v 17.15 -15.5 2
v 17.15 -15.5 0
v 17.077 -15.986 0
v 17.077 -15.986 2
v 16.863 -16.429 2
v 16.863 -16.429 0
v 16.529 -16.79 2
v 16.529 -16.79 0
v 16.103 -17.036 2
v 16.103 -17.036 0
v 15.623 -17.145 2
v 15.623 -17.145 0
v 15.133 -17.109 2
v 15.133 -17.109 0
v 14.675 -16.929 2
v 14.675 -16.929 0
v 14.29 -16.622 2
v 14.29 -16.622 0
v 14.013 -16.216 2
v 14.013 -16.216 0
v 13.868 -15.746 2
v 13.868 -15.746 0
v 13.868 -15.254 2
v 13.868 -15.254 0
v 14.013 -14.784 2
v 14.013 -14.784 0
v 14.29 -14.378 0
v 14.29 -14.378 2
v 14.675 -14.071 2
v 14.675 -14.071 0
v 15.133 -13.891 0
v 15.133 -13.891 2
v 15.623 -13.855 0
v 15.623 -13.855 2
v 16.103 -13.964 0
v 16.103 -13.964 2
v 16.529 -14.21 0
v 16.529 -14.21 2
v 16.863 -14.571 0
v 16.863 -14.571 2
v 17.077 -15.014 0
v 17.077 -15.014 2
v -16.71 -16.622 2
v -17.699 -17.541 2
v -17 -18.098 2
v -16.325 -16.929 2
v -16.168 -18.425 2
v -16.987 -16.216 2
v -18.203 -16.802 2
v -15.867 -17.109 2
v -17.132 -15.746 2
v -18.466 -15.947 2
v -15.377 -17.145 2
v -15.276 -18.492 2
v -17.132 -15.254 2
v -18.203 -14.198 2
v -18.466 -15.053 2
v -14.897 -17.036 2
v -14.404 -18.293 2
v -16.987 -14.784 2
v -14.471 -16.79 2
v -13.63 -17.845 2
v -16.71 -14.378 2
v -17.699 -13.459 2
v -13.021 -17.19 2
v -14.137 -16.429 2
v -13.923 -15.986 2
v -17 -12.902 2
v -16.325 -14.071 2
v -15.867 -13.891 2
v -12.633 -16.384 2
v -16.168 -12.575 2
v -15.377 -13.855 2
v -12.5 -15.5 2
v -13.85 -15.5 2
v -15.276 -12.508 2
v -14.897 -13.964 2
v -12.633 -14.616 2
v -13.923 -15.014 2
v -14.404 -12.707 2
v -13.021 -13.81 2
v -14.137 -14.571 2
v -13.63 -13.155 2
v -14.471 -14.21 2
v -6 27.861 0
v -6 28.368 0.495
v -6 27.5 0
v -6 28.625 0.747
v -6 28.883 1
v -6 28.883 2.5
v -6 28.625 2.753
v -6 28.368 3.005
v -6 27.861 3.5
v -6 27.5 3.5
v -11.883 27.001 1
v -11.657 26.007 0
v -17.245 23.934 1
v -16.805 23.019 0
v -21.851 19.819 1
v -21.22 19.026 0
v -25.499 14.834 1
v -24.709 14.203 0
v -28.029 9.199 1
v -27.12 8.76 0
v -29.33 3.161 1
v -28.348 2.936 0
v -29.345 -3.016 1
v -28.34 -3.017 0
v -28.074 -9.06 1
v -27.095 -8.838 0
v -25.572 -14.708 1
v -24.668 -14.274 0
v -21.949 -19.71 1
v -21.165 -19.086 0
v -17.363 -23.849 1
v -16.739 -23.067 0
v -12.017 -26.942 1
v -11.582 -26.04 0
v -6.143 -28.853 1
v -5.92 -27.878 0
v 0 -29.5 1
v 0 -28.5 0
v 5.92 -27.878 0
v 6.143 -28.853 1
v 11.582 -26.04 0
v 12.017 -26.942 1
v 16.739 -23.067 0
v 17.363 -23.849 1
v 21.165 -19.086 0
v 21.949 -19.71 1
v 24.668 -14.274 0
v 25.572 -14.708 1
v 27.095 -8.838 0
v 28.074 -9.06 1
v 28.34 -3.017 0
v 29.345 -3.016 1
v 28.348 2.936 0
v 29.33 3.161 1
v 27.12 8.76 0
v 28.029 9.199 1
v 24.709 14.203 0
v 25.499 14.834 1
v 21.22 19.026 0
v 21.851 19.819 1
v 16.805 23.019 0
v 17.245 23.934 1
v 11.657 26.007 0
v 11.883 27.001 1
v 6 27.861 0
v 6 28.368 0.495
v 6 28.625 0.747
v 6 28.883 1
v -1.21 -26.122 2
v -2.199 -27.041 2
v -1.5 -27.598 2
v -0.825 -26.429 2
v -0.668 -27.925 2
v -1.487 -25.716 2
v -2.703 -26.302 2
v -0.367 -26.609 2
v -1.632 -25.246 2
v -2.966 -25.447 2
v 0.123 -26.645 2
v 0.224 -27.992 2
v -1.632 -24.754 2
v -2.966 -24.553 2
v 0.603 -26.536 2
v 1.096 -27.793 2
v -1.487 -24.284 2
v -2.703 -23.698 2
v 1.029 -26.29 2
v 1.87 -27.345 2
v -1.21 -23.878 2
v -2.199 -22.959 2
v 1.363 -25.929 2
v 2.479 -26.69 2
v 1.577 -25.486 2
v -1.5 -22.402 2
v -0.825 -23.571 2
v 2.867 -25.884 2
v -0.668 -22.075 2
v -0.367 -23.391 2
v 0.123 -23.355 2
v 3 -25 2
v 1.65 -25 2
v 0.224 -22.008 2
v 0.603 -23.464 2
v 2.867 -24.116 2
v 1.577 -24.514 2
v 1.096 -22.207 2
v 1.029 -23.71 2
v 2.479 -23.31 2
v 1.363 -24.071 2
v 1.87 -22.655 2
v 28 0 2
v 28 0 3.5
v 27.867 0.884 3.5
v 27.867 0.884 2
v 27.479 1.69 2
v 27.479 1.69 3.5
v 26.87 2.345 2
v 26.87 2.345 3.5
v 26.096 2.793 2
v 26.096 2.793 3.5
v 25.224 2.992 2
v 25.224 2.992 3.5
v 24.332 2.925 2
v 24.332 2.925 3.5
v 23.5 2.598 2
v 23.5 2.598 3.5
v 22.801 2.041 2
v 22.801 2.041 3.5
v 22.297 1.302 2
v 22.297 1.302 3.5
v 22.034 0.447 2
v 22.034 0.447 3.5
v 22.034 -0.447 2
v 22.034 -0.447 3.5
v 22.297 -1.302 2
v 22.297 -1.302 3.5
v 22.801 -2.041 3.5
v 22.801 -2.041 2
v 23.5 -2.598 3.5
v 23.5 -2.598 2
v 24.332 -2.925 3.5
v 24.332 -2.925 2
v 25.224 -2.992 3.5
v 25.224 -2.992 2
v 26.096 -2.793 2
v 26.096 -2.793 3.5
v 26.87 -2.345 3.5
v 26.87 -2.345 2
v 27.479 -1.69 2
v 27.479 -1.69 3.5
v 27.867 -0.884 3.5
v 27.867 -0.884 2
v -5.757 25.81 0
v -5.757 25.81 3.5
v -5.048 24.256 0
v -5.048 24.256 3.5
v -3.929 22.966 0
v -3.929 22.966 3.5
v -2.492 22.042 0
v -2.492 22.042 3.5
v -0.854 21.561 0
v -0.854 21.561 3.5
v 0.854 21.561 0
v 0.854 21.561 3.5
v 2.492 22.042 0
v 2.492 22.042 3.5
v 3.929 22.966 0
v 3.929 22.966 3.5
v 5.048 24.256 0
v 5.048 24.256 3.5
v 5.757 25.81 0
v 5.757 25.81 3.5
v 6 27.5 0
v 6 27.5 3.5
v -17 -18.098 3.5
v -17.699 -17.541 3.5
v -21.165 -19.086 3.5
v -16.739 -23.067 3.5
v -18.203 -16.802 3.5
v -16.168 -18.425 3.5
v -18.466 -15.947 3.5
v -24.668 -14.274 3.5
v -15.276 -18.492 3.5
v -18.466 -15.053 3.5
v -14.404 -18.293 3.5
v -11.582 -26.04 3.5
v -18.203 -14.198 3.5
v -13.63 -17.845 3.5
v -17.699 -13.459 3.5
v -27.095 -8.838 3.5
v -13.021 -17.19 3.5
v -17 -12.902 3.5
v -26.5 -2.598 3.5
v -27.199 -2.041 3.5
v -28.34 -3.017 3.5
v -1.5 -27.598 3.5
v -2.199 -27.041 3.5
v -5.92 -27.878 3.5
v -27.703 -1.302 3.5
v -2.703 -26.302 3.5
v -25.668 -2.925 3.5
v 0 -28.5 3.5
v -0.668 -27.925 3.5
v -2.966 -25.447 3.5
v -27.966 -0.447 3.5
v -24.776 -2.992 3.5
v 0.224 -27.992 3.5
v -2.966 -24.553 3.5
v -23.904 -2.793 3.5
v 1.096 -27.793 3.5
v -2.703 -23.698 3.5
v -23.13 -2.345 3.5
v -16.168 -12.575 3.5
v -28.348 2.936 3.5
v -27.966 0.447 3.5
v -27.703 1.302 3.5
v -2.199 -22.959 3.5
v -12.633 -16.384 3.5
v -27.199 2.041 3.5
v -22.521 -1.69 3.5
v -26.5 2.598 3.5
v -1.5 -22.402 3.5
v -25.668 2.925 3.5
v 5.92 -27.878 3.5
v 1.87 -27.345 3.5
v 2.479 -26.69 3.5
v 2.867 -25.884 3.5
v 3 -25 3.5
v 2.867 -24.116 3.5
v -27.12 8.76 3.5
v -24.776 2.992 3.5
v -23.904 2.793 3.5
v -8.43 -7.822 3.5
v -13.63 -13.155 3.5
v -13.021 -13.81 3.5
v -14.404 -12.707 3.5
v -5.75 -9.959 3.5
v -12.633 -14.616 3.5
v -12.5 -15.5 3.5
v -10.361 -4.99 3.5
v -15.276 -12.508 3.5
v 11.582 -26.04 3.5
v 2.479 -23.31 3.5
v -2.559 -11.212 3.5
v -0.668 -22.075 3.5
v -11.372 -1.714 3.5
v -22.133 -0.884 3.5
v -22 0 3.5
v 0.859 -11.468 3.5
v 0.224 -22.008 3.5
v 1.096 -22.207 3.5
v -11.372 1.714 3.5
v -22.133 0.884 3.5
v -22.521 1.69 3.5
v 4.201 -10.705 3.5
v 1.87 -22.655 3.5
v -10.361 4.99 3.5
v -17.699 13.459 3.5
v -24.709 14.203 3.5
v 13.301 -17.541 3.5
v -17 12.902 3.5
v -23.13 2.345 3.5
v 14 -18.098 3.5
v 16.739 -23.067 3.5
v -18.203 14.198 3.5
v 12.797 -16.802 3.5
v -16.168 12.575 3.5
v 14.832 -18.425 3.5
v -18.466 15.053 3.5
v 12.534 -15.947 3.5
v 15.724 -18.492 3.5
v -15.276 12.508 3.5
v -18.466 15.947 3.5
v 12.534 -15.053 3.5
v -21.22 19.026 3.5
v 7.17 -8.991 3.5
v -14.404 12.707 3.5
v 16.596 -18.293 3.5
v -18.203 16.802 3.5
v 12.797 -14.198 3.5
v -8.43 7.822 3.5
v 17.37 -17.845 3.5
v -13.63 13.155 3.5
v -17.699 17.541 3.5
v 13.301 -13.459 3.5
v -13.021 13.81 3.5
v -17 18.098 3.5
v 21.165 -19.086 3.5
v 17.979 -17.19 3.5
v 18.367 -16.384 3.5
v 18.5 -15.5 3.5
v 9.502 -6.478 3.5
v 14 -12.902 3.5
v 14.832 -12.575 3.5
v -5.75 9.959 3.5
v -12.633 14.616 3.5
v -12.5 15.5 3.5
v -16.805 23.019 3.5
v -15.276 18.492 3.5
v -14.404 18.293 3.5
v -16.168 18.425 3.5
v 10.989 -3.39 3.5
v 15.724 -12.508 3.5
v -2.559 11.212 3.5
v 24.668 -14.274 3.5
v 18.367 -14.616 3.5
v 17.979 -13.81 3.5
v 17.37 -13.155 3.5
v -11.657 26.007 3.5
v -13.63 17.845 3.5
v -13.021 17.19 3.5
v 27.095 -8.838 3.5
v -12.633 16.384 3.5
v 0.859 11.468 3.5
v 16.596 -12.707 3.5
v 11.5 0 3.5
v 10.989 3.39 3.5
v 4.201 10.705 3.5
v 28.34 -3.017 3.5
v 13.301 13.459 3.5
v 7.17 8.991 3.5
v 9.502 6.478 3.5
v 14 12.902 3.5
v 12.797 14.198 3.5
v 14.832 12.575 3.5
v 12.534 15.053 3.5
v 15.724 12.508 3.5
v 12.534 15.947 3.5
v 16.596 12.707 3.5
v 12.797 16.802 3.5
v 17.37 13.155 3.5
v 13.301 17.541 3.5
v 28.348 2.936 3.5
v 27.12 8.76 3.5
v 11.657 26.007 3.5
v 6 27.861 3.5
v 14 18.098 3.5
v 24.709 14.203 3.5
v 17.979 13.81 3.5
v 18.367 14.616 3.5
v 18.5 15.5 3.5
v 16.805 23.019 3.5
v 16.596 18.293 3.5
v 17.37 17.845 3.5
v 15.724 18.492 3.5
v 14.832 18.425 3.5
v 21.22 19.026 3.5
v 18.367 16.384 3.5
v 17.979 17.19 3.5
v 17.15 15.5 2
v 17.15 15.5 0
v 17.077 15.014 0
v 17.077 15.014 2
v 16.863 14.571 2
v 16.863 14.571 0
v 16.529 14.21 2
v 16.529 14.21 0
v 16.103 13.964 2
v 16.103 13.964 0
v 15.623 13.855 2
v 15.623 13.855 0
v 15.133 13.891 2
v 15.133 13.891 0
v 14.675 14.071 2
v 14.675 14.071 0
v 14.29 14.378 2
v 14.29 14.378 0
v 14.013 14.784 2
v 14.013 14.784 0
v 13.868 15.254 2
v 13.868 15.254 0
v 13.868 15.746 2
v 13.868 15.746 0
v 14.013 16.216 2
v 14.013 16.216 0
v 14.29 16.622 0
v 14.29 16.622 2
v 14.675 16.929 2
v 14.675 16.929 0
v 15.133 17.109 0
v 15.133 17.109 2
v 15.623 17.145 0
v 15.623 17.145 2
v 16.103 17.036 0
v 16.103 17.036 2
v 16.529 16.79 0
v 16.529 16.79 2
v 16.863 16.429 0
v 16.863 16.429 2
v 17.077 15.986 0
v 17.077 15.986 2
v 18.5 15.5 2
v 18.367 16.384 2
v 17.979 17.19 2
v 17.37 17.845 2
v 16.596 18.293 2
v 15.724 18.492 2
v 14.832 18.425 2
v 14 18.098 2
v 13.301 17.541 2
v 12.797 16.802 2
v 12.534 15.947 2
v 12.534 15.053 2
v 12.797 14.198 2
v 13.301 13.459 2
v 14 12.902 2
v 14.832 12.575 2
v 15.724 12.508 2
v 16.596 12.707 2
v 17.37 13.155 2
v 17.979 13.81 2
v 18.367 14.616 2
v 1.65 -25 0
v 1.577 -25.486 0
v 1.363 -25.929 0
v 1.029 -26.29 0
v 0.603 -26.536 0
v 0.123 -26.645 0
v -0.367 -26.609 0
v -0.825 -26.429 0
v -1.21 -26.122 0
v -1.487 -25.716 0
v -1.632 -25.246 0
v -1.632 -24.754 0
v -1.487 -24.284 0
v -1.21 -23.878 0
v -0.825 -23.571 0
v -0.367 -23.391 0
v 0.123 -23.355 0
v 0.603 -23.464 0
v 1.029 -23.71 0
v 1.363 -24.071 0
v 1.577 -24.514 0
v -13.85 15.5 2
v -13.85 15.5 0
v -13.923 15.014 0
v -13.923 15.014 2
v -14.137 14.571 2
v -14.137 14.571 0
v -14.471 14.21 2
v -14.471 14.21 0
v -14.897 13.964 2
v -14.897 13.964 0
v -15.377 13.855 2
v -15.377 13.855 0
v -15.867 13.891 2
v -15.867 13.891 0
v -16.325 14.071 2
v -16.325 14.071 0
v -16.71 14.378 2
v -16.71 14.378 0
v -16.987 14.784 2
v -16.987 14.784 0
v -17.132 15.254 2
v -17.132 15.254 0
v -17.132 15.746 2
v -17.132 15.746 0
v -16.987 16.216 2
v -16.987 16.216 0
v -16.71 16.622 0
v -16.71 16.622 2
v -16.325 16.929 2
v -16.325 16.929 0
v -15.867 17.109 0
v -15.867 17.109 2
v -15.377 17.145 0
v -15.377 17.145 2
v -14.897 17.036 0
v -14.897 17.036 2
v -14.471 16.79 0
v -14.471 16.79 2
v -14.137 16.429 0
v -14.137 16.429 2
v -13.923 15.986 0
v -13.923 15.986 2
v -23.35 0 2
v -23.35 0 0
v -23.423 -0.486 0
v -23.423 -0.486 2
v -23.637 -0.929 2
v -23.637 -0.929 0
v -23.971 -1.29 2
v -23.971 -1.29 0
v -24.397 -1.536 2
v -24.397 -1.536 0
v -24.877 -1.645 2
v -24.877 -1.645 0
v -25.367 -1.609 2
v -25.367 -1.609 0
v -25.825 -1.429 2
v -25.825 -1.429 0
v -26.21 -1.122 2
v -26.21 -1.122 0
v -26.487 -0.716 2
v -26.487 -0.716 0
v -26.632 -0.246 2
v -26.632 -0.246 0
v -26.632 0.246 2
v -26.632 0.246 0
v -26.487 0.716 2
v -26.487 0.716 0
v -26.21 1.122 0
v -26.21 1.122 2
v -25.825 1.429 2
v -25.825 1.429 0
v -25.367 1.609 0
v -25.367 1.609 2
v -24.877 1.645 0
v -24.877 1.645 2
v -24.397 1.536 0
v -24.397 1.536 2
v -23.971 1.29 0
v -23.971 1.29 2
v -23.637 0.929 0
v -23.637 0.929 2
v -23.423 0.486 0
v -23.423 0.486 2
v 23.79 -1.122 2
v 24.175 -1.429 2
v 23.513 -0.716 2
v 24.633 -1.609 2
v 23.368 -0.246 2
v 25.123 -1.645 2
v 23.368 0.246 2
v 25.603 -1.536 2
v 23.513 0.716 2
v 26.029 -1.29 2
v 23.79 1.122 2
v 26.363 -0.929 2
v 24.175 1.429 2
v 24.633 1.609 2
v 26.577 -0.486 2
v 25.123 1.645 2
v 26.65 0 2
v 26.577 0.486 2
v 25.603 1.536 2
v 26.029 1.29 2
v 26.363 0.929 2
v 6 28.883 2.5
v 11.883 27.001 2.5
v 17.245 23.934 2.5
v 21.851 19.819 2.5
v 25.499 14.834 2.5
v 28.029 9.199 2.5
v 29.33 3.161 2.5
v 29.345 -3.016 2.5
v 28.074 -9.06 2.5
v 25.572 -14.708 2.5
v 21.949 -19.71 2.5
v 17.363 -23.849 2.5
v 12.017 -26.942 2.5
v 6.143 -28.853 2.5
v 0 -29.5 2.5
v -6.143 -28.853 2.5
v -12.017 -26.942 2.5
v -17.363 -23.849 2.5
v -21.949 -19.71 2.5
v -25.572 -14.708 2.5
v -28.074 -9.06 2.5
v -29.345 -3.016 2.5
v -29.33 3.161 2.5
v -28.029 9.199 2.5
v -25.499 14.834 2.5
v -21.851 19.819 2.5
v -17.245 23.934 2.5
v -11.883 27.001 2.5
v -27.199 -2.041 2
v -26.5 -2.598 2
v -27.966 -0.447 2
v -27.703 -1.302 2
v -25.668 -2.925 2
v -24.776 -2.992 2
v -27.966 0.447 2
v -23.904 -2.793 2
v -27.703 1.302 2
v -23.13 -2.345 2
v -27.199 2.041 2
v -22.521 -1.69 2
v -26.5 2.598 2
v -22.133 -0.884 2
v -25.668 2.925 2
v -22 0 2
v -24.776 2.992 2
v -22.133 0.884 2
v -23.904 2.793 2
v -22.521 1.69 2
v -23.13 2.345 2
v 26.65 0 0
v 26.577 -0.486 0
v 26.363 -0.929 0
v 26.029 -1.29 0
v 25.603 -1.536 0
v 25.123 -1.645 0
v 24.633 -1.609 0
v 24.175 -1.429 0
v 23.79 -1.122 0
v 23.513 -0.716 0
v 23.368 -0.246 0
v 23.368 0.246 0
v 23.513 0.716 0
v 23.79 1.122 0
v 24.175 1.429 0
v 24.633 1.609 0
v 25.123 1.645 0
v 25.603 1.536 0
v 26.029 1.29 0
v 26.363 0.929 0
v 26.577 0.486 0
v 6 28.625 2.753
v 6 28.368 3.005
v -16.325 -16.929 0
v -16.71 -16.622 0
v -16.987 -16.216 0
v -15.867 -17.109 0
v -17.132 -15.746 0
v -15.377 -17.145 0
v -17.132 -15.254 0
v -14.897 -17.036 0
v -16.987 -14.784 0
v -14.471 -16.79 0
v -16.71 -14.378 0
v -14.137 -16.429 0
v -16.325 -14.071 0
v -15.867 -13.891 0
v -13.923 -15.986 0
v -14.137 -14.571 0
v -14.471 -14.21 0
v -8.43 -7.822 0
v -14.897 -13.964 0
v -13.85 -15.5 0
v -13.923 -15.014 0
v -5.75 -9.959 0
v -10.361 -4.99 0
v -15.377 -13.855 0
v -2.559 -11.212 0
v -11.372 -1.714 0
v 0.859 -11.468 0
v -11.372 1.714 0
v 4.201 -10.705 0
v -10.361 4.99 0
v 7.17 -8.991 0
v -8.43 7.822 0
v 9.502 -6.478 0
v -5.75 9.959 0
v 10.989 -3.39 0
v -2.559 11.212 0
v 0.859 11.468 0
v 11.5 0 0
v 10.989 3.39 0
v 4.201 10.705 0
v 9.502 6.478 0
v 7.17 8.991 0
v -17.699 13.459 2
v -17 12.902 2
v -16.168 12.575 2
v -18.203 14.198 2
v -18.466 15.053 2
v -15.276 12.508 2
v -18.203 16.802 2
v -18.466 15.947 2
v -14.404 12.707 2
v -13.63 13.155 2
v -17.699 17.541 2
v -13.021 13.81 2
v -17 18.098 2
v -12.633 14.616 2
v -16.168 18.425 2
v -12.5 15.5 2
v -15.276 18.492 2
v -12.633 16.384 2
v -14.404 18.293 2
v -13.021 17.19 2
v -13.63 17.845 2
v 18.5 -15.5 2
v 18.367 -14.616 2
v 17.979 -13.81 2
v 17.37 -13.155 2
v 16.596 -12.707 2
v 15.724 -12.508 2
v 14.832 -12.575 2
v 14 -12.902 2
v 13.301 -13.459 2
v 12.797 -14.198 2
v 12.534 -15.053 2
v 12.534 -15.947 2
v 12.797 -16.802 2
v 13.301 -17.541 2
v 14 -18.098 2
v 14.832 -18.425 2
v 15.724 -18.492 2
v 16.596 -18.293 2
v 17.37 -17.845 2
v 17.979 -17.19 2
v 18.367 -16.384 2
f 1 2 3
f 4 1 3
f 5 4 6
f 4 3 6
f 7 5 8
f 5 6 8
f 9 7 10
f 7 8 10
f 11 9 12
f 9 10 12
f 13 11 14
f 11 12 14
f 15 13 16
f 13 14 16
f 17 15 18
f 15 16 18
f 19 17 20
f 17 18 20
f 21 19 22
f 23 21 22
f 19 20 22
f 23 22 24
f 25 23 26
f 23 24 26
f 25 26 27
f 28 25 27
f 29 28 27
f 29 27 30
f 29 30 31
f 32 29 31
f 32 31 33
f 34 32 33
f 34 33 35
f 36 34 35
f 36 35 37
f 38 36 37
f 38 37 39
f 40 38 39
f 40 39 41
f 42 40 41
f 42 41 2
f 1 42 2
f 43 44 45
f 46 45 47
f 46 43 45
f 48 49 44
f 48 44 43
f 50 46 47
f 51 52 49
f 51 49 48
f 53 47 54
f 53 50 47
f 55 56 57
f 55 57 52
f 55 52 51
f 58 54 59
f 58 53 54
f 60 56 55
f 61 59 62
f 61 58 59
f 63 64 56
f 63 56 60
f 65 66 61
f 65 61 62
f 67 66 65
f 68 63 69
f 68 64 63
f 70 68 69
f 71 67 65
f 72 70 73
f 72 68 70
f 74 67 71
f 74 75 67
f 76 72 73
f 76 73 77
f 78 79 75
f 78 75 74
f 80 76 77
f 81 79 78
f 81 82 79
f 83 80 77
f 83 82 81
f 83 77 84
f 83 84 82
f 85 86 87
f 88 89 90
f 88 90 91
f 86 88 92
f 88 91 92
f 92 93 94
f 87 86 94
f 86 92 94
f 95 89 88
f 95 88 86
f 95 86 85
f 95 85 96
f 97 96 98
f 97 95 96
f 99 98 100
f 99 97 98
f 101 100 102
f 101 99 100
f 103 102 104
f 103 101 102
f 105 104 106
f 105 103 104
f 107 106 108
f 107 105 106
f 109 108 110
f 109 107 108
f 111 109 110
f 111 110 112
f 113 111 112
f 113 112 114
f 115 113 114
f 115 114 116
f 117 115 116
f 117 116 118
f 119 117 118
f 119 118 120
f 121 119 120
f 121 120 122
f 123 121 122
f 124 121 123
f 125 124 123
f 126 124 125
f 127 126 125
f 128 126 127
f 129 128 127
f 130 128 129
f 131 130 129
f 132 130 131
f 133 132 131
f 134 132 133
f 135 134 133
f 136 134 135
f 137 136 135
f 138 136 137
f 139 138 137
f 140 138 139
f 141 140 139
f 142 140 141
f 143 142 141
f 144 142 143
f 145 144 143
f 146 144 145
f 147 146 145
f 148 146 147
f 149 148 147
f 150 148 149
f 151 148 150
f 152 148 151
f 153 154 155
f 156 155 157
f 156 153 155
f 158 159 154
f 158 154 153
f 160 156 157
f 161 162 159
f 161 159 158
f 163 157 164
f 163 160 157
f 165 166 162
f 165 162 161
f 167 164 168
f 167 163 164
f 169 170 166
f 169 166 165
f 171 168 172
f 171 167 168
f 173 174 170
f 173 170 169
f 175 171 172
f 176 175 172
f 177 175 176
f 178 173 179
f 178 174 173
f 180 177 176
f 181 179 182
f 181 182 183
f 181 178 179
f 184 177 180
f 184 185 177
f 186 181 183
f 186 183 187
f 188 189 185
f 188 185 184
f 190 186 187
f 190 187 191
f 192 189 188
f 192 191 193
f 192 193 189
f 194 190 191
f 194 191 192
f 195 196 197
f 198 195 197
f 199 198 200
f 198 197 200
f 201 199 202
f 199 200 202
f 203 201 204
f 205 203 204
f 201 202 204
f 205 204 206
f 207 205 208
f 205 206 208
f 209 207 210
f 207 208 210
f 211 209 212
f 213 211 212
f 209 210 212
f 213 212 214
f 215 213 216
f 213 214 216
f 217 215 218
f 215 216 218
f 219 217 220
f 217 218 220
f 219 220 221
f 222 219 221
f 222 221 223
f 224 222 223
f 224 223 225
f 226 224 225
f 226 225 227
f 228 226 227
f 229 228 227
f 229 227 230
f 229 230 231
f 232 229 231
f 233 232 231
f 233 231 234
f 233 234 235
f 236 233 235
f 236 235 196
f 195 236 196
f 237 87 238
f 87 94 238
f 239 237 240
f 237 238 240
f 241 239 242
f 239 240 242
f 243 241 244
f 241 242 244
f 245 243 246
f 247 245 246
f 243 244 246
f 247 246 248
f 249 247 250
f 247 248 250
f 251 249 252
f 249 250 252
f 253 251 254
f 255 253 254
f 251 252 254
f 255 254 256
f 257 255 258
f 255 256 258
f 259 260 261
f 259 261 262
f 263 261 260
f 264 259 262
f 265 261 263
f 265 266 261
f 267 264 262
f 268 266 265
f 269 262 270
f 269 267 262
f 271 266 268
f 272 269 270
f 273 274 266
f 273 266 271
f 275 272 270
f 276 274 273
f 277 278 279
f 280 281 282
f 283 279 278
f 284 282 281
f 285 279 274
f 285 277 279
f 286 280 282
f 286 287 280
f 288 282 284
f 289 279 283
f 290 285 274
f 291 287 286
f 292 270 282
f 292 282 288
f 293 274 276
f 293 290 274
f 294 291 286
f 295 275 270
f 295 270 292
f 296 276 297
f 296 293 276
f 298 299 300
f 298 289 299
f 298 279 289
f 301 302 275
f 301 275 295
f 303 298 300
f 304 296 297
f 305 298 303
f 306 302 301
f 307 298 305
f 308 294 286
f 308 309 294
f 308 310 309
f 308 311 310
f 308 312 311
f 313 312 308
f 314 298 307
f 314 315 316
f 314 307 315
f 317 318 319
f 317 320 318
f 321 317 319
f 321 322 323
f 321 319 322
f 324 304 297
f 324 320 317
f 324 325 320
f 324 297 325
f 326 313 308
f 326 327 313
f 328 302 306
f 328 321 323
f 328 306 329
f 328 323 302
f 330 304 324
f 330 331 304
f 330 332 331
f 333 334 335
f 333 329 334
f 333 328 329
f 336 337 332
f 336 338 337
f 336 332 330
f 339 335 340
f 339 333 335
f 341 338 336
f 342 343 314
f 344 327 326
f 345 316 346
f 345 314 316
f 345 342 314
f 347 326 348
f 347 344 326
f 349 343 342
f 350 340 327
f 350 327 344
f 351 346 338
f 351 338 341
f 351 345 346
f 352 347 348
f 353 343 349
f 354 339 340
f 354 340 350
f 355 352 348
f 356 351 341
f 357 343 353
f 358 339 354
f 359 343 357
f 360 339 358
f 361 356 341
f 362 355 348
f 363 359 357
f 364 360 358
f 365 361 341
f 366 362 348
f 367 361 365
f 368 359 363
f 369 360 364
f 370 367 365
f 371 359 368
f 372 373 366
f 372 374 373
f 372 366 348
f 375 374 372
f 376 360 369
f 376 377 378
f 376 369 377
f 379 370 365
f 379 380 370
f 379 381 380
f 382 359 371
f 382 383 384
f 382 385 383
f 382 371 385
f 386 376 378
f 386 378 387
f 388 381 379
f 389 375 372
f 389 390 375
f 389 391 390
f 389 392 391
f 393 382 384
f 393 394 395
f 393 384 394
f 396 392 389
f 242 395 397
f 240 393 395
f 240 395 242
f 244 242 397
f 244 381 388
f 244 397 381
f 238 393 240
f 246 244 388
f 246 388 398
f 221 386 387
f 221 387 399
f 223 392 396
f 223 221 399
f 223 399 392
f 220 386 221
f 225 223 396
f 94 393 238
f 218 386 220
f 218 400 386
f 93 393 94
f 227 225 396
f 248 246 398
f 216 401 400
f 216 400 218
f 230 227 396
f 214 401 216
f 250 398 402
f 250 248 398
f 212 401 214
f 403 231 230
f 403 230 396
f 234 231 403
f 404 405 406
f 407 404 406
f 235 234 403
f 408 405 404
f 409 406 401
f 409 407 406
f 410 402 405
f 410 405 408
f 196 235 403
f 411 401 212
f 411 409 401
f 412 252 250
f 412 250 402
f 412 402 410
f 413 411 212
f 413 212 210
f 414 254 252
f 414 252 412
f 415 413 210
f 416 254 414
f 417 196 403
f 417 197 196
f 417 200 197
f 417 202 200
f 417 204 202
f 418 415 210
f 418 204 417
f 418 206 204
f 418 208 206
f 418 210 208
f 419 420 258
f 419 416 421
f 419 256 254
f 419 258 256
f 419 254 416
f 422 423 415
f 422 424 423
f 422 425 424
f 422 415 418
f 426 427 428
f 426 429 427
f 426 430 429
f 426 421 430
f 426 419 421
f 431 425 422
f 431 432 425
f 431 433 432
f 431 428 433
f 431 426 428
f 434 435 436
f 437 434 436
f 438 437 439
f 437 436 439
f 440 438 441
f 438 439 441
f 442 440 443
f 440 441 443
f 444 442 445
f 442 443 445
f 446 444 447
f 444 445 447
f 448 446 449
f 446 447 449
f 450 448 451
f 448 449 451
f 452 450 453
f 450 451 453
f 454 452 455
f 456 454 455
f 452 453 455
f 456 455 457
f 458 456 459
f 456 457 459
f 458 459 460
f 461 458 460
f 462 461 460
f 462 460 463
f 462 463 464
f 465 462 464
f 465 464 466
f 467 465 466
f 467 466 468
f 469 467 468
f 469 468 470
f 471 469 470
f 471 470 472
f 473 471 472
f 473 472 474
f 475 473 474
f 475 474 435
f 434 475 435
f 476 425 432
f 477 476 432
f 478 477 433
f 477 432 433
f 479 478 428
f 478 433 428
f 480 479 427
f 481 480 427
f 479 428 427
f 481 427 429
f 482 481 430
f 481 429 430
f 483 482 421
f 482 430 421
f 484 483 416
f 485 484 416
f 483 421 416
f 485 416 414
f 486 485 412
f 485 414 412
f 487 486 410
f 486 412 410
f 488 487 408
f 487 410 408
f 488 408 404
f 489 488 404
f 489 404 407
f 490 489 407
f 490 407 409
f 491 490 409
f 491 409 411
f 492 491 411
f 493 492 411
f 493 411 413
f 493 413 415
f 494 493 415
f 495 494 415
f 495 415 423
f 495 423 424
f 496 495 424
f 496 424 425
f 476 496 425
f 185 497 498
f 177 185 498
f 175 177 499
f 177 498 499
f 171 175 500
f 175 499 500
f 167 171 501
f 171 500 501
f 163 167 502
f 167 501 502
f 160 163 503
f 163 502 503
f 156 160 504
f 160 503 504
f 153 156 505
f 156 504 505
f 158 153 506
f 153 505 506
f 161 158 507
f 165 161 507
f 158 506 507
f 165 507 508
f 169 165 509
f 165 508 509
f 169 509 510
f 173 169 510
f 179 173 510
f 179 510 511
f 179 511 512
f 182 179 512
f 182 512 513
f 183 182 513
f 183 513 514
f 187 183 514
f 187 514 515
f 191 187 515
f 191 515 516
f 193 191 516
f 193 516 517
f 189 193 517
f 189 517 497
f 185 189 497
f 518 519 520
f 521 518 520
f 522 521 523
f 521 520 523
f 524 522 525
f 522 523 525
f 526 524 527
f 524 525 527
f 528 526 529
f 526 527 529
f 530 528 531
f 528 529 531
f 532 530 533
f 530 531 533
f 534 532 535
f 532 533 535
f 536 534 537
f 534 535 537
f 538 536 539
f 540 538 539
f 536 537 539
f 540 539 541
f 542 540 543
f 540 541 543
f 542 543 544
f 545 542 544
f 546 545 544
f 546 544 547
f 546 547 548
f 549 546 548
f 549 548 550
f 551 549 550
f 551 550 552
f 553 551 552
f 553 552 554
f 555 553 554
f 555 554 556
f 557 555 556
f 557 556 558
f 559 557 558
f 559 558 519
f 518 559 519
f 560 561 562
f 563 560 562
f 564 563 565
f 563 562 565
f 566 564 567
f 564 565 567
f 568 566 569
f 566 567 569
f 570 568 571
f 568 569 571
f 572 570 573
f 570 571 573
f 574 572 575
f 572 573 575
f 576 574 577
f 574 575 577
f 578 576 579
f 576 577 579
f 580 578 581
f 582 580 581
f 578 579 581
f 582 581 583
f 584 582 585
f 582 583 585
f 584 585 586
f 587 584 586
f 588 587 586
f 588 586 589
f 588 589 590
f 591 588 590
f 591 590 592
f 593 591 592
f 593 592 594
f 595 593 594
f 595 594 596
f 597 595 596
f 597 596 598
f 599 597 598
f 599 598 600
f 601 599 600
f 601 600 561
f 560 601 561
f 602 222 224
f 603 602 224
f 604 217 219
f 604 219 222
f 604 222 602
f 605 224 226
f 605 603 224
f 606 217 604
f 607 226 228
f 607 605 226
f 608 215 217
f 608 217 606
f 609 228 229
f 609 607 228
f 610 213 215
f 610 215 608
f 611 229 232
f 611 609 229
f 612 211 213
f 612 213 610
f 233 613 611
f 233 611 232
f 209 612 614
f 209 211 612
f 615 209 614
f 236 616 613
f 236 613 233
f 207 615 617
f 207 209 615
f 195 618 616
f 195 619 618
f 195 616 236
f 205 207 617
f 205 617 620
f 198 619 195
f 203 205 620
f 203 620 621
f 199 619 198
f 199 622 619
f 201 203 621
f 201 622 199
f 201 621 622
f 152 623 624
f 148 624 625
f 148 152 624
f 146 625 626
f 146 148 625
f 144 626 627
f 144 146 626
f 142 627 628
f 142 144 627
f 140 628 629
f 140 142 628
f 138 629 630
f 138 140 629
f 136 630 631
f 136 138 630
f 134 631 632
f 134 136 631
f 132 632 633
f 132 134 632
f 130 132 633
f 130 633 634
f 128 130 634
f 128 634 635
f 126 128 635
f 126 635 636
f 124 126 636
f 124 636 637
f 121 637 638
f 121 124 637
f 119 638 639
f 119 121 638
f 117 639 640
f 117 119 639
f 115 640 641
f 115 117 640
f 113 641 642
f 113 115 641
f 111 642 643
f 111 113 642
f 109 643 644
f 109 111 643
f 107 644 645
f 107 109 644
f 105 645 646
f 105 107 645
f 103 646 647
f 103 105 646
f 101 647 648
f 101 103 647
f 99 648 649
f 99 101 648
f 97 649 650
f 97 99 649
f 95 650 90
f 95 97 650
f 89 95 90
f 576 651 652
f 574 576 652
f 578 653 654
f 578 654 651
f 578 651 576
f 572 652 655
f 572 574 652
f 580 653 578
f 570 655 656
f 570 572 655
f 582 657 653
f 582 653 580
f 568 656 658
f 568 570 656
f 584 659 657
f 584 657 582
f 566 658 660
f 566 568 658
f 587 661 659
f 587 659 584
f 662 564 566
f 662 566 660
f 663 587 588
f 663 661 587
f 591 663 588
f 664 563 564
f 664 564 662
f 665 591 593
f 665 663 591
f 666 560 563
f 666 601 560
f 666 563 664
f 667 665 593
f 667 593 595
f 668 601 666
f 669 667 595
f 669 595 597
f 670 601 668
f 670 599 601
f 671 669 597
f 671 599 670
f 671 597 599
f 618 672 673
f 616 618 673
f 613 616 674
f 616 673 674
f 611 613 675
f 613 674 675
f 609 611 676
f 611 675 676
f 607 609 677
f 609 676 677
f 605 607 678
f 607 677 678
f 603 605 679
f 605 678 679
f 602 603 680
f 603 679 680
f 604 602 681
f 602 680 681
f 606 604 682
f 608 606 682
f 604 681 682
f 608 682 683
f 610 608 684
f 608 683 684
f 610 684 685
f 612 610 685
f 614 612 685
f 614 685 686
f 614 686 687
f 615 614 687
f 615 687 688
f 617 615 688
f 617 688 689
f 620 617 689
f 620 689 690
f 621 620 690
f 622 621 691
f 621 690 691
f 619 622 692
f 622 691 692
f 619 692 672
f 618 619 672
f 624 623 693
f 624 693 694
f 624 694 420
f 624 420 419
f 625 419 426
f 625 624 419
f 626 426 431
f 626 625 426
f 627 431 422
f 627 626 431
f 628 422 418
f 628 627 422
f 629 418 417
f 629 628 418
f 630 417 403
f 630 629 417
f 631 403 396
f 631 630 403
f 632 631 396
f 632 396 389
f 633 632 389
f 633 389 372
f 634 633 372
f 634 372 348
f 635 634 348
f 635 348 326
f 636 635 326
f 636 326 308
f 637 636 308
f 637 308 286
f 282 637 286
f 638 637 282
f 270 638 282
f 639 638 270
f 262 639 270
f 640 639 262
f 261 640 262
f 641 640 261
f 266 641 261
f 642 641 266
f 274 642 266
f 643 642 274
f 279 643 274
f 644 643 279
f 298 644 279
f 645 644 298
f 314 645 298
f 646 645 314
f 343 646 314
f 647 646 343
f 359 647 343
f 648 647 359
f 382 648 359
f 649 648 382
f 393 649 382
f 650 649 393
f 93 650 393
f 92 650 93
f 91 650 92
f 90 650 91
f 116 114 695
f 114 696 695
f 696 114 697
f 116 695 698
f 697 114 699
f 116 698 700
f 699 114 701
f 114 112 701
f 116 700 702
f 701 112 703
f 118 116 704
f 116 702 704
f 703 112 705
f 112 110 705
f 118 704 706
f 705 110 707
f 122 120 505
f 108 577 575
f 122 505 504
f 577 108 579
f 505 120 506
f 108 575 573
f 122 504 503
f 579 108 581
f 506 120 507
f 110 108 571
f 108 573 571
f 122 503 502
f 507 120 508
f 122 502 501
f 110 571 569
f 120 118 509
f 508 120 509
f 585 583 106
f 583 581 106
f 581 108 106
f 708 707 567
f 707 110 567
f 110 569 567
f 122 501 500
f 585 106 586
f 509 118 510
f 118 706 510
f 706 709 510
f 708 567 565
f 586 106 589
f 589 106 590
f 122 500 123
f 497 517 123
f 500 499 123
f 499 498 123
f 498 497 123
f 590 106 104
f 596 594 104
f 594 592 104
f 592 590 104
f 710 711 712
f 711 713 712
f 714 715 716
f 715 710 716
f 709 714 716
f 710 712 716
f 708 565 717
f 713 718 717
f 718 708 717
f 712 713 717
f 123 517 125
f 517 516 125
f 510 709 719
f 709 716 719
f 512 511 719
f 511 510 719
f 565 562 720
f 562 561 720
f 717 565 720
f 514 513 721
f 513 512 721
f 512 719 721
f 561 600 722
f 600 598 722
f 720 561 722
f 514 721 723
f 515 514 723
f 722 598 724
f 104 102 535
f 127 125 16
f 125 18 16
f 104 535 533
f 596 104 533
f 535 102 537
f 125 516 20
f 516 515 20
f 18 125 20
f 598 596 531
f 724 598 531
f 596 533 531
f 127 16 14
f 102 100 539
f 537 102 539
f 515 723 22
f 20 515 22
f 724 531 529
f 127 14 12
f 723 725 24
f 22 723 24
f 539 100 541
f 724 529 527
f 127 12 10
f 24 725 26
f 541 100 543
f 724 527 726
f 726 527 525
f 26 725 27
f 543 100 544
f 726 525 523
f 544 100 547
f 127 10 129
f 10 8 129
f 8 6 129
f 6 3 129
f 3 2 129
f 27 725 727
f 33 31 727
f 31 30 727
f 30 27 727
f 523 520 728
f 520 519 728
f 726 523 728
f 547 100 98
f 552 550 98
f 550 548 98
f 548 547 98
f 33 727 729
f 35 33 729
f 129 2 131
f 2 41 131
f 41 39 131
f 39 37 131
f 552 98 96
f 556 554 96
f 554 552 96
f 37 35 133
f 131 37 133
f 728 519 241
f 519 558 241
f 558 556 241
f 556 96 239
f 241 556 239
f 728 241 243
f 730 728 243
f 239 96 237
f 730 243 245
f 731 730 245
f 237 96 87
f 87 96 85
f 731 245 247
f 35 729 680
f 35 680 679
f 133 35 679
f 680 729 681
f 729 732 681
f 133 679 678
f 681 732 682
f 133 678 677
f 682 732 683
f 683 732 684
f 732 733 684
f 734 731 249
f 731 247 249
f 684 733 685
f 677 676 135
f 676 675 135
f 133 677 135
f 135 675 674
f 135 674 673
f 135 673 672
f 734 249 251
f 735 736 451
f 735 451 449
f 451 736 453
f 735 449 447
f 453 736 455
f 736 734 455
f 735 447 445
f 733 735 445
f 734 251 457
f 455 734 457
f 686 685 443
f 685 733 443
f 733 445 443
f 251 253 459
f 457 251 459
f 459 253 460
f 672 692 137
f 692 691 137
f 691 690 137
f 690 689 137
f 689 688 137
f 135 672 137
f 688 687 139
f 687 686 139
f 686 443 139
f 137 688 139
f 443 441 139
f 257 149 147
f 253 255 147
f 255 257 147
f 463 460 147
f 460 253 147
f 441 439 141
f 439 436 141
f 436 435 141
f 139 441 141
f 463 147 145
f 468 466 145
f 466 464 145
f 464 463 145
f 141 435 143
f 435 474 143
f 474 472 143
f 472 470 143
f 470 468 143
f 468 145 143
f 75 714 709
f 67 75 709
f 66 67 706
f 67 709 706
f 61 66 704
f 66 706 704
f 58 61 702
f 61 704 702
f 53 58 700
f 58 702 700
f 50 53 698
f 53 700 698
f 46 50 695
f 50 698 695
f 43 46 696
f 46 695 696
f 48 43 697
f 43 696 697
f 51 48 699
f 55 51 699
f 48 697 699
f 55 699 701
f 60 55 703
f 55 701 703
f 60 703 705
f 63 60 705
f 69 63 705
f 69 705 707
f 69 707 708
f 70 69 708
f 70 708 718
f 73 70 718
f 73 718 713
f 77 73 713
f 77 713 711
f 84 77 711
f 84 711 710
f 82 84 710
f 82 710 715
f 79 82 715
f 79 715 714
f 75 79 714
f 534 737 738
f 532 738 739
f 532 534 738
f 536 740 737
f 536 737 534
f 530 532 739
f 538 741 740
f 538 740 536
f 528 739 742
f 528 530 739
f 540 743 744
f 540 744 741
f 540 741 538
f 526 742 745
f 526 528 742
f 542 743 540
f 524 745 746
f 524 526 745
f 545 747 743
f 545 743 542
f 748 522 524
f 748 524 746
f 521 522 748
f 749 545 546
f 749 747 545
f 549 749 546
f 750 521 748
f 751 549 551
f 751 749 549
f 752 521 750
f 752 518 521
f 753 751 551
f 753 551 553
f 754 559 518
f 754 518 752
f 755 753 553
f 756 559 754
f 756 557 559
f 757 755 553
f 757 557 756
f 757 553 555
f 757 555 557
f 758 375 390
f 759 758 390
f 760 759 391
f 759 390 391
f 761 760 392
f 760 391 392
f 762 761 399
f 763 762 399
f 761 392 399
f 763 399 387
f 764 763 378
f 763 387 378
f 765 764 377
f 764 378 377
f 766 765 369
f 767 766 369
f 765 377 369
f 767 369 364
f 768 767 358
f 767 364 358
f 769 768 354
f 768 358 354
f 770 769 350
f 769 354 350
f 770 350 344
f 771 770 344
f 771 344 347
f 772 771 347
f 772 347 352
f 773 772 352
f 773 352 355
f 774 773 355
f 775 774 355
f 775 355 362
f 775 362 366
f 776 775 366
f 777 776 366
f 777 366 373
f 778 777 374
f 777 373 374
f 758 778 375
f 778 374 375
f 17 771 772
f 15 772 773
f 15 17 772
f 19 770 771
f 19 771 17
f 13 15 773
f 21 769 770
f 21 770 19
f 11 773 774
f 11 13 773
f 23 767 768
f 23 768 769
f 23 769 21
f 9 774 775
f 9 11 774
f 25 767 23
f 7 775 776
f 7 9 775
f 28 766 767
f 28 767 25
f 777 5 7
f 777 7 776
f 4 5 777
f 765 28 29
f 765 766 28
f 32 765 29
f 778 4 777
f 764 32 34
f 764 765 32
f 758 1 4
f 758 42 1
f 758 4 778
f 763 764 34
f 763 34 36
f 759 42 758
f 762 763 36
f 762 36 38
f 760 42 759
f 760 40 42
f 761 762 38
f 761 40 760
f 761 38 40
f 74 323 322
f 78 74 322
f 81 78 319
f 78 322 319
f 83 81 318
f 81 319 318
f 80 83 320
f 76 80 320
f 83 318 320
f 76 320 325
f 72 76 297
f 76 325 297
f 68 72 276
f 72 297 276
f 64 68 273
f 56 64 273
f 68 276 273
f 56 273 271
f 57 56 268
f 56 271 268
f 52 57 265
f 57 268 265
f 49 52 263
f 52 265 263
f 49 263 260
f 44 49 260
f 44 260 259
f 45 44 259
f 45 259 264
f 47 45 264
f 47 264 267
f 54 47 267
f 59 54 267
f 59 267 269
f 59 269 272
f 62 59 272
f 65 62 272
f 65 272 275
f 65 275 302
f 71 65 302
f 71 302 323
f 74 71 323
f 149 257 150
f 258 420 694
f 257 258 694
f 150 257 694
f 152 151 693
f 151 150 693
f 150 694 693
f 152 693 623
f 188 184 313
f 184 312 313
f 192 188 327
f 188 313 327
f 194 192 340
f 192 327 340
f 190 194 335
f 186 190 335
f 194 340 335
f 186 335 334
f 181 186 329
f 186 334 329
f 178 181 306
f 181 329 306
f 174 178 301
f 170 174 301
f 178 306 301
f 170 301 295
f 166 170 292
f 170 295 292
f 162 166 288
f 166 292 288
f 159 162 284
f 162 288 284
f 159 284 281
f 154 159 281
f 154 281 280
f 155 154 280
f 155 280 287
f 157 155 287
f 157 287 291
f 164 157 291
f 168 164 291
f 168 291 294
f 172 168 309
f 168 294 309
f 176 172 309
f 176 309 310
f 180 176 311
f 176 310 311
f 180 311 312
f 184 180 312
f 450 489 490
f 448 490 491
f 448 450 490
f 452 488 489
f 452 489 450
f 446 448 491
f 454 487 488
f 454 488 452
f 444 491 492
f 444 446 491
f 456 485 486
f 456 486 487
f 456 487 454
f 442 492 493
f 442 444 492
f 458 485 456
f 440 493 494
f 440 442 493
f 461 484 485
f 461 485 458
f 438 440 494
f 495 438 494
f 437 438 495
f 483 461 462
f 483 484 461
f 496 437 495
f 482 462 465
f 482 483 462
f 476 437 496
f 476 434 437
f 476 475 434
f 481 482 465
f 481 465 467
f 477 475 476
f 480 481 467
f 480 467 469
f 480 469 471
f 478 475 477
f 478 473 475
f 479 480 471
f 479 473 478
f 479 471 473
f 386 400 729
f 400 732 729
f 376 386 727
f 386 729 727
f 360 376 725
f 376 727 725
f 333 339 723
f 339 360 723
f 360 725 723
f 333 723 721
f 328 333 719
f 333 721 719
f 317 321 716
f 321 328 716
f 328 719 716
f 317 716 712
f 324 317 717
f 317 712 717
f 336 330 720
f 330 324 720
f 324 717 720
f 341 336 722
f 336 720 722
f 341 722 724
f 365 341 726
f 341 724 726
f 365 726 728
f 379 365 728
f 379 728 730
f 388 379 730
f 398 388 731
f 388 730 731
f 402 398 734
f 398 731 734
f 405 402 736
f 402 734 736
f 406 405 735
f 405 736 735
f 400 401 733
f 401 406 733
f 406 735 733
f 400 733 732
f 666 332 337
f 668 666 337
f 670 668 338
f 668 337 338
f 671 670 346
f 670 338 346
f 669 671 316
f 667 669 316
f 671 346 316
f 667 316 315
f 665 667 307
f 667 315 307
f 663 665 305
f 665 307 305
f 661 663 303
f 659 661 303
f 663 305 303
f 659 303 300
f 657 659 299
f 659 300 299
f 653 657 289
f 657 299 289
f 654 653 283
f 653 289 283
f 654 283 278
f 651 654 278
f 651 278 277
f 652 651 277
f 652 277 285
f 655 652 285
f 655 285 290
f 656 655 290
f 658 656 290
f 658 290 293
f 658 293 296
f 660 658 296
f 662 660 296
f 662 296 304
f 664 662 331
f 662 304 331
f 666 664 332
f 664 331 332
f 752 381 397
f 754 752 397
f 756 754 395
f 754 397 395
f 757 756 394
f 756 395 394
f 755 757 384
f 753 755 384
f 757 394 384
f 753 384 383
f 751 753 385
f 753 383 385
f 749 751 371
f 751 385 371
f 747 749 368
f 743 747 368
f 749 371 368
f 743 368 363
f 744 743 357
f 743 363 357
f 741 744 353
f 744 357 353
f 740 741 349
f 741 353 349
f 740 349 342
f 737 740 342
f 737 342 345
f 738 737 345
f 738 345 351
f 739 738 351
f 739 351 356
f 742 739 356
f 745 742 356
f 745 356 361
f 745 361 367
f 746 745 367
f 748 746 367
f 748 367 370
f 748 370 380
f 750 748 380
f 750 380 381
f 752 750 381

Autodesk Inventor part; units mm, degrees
ref_plane "YZ Plane" through (0, 0, 0) normal (1, 0, 0) x (0, 1, 0)
ref_plane "XZ Plane" through (0, 0, 0) normal (0, 1, 0) x (-1, 0, 0)
ref_plane "XY Plane" through (0, 0, 0) normal (0, 0, 1) x (1, 0, 0)
sketch "Sketch1" plane through (0, 0, 0) normal (0, 0, 1) x (1, 0, 0)
  circle A0 centre (0, 0) radius 29.5
  line L0 (-15.5, -15.5) -> (15.5, -15.5) construction
  line L1 (15.5, -15.5) -> (15.5, 15.5) construction
  line L2 (15.5, 15.5) -> (-15.5, 15.5) construction
  line L3 (-15.5, 15.5) -> (-15.5, -15.5) construction
  line L4 (-15.5, -15.5) -> (15.5, 15.5) construction
  line L5 (15.5, -15.5) -> (-15.5, 15.5) construction
  circle A1 centre (-15.5, 15.5) radius 1.65
  circle A2 centre (15.5, 15.5) radius 1.65
  circle A3 centre (15.5, -15.5) radius 1.65
  circle A4 centre (-15.5, -15.5) radius 1.65
  circle A5 centre (0, 0) radius 11.5
  line L6 (0, 0) -> (25, 0) construction
  circle A6 centre (0, 0) radius 25 construction
  circle A7 centre (25, 0) radius 1.65
  circle A8 centre (-25, 0) radius 1.65
  circle A9 centre (0, -25) radius 1.65
  line L7 (-25, 0) -> (0, 0) construction
  line L8 (0, 0) -> (0, -25) construction
  dimension "d0" = 59
  dimension "d1" = 3.3
  dimension "d2" = 23
  dimension "d3" = 31
  dimension "d4" = 50
  dimension "d5" = 3.3
extrude "Extrusion1" add sketch "Sketch1" along normal blind 3.5
sketch "Sketch2" plane through (0, 0, 3.5) normal (0, 0, 1) x (1, 0, 0)
  circle A0 centre (0, -25) radius 1.65 projected
  circle A1 centre (0, -25) radius 3
  circle A2 centre (25, 0) radius 1.65 projected
  circle A3 centre (25, 0) radius 3
  circle A4 centre (-25, 0) radius 1.65 projected
  circle A5 centre (-25, 0) radius 3
  circle A6 centre (-15.5, -15.5) radius 1.65 projected
  circle A7 centre (-15.5, -15.5) radius 3
  circle A8 centre (15.5, -15.5) radius 1.65 projected
  circle A9 centre (15.5, -15.5) radius 3
  circle A10 centre (15.5, 15.5) radius 1.65 projected
  circle A11 centre (15.5, 15.5) radius 3
  circle A12 centre (-15.5, 15.5) radius 1.65 projected
  circle A13 centre (-15.5, 15.5) radius 3
  point P0 (0, 0)
  dimension "d8" = 6
extrude "Extrusion2" cut sketch "Sketch2" against normal blind 1.5 contours A0 | A1 | A2 | A3 | A4 | A5 | A6 | A7 | A8 | A9 | A10 | A11 | A12 | A13
sketch "Sketch3" plane through (0, 0, 3.5) normal (0, 0, 1) x (1, 0, 0)
  line L0 (0, 31.5) -> (0, 27.5) construction
  circle A0 centre (0, 0) radius 29.5 construction
  line L1 (-6, 31.5) -> (-6, 27.5)
  line L2 (6, 27.5) -> (6, 31.5)
  arc A1 (6, 31.5) -> (-6, 31.5) centre (0, 31.5) ccw
  arc A2 (-6, 27.5) -> (6, 27.5) centre (0, 27.5) ccw
  point P0 (0, 29.5)
  dimension "d14" = 2
  dimension "d15" = 6
extrude "Extrusion3" cut sketch "Sketch3" against normal through all
chamfer "Chamfer1" distance 1 angle 45 2 edges at (0, -29.5, 3.5) (0, -29.5, 0)
properties part number "WristMotorPlate"
